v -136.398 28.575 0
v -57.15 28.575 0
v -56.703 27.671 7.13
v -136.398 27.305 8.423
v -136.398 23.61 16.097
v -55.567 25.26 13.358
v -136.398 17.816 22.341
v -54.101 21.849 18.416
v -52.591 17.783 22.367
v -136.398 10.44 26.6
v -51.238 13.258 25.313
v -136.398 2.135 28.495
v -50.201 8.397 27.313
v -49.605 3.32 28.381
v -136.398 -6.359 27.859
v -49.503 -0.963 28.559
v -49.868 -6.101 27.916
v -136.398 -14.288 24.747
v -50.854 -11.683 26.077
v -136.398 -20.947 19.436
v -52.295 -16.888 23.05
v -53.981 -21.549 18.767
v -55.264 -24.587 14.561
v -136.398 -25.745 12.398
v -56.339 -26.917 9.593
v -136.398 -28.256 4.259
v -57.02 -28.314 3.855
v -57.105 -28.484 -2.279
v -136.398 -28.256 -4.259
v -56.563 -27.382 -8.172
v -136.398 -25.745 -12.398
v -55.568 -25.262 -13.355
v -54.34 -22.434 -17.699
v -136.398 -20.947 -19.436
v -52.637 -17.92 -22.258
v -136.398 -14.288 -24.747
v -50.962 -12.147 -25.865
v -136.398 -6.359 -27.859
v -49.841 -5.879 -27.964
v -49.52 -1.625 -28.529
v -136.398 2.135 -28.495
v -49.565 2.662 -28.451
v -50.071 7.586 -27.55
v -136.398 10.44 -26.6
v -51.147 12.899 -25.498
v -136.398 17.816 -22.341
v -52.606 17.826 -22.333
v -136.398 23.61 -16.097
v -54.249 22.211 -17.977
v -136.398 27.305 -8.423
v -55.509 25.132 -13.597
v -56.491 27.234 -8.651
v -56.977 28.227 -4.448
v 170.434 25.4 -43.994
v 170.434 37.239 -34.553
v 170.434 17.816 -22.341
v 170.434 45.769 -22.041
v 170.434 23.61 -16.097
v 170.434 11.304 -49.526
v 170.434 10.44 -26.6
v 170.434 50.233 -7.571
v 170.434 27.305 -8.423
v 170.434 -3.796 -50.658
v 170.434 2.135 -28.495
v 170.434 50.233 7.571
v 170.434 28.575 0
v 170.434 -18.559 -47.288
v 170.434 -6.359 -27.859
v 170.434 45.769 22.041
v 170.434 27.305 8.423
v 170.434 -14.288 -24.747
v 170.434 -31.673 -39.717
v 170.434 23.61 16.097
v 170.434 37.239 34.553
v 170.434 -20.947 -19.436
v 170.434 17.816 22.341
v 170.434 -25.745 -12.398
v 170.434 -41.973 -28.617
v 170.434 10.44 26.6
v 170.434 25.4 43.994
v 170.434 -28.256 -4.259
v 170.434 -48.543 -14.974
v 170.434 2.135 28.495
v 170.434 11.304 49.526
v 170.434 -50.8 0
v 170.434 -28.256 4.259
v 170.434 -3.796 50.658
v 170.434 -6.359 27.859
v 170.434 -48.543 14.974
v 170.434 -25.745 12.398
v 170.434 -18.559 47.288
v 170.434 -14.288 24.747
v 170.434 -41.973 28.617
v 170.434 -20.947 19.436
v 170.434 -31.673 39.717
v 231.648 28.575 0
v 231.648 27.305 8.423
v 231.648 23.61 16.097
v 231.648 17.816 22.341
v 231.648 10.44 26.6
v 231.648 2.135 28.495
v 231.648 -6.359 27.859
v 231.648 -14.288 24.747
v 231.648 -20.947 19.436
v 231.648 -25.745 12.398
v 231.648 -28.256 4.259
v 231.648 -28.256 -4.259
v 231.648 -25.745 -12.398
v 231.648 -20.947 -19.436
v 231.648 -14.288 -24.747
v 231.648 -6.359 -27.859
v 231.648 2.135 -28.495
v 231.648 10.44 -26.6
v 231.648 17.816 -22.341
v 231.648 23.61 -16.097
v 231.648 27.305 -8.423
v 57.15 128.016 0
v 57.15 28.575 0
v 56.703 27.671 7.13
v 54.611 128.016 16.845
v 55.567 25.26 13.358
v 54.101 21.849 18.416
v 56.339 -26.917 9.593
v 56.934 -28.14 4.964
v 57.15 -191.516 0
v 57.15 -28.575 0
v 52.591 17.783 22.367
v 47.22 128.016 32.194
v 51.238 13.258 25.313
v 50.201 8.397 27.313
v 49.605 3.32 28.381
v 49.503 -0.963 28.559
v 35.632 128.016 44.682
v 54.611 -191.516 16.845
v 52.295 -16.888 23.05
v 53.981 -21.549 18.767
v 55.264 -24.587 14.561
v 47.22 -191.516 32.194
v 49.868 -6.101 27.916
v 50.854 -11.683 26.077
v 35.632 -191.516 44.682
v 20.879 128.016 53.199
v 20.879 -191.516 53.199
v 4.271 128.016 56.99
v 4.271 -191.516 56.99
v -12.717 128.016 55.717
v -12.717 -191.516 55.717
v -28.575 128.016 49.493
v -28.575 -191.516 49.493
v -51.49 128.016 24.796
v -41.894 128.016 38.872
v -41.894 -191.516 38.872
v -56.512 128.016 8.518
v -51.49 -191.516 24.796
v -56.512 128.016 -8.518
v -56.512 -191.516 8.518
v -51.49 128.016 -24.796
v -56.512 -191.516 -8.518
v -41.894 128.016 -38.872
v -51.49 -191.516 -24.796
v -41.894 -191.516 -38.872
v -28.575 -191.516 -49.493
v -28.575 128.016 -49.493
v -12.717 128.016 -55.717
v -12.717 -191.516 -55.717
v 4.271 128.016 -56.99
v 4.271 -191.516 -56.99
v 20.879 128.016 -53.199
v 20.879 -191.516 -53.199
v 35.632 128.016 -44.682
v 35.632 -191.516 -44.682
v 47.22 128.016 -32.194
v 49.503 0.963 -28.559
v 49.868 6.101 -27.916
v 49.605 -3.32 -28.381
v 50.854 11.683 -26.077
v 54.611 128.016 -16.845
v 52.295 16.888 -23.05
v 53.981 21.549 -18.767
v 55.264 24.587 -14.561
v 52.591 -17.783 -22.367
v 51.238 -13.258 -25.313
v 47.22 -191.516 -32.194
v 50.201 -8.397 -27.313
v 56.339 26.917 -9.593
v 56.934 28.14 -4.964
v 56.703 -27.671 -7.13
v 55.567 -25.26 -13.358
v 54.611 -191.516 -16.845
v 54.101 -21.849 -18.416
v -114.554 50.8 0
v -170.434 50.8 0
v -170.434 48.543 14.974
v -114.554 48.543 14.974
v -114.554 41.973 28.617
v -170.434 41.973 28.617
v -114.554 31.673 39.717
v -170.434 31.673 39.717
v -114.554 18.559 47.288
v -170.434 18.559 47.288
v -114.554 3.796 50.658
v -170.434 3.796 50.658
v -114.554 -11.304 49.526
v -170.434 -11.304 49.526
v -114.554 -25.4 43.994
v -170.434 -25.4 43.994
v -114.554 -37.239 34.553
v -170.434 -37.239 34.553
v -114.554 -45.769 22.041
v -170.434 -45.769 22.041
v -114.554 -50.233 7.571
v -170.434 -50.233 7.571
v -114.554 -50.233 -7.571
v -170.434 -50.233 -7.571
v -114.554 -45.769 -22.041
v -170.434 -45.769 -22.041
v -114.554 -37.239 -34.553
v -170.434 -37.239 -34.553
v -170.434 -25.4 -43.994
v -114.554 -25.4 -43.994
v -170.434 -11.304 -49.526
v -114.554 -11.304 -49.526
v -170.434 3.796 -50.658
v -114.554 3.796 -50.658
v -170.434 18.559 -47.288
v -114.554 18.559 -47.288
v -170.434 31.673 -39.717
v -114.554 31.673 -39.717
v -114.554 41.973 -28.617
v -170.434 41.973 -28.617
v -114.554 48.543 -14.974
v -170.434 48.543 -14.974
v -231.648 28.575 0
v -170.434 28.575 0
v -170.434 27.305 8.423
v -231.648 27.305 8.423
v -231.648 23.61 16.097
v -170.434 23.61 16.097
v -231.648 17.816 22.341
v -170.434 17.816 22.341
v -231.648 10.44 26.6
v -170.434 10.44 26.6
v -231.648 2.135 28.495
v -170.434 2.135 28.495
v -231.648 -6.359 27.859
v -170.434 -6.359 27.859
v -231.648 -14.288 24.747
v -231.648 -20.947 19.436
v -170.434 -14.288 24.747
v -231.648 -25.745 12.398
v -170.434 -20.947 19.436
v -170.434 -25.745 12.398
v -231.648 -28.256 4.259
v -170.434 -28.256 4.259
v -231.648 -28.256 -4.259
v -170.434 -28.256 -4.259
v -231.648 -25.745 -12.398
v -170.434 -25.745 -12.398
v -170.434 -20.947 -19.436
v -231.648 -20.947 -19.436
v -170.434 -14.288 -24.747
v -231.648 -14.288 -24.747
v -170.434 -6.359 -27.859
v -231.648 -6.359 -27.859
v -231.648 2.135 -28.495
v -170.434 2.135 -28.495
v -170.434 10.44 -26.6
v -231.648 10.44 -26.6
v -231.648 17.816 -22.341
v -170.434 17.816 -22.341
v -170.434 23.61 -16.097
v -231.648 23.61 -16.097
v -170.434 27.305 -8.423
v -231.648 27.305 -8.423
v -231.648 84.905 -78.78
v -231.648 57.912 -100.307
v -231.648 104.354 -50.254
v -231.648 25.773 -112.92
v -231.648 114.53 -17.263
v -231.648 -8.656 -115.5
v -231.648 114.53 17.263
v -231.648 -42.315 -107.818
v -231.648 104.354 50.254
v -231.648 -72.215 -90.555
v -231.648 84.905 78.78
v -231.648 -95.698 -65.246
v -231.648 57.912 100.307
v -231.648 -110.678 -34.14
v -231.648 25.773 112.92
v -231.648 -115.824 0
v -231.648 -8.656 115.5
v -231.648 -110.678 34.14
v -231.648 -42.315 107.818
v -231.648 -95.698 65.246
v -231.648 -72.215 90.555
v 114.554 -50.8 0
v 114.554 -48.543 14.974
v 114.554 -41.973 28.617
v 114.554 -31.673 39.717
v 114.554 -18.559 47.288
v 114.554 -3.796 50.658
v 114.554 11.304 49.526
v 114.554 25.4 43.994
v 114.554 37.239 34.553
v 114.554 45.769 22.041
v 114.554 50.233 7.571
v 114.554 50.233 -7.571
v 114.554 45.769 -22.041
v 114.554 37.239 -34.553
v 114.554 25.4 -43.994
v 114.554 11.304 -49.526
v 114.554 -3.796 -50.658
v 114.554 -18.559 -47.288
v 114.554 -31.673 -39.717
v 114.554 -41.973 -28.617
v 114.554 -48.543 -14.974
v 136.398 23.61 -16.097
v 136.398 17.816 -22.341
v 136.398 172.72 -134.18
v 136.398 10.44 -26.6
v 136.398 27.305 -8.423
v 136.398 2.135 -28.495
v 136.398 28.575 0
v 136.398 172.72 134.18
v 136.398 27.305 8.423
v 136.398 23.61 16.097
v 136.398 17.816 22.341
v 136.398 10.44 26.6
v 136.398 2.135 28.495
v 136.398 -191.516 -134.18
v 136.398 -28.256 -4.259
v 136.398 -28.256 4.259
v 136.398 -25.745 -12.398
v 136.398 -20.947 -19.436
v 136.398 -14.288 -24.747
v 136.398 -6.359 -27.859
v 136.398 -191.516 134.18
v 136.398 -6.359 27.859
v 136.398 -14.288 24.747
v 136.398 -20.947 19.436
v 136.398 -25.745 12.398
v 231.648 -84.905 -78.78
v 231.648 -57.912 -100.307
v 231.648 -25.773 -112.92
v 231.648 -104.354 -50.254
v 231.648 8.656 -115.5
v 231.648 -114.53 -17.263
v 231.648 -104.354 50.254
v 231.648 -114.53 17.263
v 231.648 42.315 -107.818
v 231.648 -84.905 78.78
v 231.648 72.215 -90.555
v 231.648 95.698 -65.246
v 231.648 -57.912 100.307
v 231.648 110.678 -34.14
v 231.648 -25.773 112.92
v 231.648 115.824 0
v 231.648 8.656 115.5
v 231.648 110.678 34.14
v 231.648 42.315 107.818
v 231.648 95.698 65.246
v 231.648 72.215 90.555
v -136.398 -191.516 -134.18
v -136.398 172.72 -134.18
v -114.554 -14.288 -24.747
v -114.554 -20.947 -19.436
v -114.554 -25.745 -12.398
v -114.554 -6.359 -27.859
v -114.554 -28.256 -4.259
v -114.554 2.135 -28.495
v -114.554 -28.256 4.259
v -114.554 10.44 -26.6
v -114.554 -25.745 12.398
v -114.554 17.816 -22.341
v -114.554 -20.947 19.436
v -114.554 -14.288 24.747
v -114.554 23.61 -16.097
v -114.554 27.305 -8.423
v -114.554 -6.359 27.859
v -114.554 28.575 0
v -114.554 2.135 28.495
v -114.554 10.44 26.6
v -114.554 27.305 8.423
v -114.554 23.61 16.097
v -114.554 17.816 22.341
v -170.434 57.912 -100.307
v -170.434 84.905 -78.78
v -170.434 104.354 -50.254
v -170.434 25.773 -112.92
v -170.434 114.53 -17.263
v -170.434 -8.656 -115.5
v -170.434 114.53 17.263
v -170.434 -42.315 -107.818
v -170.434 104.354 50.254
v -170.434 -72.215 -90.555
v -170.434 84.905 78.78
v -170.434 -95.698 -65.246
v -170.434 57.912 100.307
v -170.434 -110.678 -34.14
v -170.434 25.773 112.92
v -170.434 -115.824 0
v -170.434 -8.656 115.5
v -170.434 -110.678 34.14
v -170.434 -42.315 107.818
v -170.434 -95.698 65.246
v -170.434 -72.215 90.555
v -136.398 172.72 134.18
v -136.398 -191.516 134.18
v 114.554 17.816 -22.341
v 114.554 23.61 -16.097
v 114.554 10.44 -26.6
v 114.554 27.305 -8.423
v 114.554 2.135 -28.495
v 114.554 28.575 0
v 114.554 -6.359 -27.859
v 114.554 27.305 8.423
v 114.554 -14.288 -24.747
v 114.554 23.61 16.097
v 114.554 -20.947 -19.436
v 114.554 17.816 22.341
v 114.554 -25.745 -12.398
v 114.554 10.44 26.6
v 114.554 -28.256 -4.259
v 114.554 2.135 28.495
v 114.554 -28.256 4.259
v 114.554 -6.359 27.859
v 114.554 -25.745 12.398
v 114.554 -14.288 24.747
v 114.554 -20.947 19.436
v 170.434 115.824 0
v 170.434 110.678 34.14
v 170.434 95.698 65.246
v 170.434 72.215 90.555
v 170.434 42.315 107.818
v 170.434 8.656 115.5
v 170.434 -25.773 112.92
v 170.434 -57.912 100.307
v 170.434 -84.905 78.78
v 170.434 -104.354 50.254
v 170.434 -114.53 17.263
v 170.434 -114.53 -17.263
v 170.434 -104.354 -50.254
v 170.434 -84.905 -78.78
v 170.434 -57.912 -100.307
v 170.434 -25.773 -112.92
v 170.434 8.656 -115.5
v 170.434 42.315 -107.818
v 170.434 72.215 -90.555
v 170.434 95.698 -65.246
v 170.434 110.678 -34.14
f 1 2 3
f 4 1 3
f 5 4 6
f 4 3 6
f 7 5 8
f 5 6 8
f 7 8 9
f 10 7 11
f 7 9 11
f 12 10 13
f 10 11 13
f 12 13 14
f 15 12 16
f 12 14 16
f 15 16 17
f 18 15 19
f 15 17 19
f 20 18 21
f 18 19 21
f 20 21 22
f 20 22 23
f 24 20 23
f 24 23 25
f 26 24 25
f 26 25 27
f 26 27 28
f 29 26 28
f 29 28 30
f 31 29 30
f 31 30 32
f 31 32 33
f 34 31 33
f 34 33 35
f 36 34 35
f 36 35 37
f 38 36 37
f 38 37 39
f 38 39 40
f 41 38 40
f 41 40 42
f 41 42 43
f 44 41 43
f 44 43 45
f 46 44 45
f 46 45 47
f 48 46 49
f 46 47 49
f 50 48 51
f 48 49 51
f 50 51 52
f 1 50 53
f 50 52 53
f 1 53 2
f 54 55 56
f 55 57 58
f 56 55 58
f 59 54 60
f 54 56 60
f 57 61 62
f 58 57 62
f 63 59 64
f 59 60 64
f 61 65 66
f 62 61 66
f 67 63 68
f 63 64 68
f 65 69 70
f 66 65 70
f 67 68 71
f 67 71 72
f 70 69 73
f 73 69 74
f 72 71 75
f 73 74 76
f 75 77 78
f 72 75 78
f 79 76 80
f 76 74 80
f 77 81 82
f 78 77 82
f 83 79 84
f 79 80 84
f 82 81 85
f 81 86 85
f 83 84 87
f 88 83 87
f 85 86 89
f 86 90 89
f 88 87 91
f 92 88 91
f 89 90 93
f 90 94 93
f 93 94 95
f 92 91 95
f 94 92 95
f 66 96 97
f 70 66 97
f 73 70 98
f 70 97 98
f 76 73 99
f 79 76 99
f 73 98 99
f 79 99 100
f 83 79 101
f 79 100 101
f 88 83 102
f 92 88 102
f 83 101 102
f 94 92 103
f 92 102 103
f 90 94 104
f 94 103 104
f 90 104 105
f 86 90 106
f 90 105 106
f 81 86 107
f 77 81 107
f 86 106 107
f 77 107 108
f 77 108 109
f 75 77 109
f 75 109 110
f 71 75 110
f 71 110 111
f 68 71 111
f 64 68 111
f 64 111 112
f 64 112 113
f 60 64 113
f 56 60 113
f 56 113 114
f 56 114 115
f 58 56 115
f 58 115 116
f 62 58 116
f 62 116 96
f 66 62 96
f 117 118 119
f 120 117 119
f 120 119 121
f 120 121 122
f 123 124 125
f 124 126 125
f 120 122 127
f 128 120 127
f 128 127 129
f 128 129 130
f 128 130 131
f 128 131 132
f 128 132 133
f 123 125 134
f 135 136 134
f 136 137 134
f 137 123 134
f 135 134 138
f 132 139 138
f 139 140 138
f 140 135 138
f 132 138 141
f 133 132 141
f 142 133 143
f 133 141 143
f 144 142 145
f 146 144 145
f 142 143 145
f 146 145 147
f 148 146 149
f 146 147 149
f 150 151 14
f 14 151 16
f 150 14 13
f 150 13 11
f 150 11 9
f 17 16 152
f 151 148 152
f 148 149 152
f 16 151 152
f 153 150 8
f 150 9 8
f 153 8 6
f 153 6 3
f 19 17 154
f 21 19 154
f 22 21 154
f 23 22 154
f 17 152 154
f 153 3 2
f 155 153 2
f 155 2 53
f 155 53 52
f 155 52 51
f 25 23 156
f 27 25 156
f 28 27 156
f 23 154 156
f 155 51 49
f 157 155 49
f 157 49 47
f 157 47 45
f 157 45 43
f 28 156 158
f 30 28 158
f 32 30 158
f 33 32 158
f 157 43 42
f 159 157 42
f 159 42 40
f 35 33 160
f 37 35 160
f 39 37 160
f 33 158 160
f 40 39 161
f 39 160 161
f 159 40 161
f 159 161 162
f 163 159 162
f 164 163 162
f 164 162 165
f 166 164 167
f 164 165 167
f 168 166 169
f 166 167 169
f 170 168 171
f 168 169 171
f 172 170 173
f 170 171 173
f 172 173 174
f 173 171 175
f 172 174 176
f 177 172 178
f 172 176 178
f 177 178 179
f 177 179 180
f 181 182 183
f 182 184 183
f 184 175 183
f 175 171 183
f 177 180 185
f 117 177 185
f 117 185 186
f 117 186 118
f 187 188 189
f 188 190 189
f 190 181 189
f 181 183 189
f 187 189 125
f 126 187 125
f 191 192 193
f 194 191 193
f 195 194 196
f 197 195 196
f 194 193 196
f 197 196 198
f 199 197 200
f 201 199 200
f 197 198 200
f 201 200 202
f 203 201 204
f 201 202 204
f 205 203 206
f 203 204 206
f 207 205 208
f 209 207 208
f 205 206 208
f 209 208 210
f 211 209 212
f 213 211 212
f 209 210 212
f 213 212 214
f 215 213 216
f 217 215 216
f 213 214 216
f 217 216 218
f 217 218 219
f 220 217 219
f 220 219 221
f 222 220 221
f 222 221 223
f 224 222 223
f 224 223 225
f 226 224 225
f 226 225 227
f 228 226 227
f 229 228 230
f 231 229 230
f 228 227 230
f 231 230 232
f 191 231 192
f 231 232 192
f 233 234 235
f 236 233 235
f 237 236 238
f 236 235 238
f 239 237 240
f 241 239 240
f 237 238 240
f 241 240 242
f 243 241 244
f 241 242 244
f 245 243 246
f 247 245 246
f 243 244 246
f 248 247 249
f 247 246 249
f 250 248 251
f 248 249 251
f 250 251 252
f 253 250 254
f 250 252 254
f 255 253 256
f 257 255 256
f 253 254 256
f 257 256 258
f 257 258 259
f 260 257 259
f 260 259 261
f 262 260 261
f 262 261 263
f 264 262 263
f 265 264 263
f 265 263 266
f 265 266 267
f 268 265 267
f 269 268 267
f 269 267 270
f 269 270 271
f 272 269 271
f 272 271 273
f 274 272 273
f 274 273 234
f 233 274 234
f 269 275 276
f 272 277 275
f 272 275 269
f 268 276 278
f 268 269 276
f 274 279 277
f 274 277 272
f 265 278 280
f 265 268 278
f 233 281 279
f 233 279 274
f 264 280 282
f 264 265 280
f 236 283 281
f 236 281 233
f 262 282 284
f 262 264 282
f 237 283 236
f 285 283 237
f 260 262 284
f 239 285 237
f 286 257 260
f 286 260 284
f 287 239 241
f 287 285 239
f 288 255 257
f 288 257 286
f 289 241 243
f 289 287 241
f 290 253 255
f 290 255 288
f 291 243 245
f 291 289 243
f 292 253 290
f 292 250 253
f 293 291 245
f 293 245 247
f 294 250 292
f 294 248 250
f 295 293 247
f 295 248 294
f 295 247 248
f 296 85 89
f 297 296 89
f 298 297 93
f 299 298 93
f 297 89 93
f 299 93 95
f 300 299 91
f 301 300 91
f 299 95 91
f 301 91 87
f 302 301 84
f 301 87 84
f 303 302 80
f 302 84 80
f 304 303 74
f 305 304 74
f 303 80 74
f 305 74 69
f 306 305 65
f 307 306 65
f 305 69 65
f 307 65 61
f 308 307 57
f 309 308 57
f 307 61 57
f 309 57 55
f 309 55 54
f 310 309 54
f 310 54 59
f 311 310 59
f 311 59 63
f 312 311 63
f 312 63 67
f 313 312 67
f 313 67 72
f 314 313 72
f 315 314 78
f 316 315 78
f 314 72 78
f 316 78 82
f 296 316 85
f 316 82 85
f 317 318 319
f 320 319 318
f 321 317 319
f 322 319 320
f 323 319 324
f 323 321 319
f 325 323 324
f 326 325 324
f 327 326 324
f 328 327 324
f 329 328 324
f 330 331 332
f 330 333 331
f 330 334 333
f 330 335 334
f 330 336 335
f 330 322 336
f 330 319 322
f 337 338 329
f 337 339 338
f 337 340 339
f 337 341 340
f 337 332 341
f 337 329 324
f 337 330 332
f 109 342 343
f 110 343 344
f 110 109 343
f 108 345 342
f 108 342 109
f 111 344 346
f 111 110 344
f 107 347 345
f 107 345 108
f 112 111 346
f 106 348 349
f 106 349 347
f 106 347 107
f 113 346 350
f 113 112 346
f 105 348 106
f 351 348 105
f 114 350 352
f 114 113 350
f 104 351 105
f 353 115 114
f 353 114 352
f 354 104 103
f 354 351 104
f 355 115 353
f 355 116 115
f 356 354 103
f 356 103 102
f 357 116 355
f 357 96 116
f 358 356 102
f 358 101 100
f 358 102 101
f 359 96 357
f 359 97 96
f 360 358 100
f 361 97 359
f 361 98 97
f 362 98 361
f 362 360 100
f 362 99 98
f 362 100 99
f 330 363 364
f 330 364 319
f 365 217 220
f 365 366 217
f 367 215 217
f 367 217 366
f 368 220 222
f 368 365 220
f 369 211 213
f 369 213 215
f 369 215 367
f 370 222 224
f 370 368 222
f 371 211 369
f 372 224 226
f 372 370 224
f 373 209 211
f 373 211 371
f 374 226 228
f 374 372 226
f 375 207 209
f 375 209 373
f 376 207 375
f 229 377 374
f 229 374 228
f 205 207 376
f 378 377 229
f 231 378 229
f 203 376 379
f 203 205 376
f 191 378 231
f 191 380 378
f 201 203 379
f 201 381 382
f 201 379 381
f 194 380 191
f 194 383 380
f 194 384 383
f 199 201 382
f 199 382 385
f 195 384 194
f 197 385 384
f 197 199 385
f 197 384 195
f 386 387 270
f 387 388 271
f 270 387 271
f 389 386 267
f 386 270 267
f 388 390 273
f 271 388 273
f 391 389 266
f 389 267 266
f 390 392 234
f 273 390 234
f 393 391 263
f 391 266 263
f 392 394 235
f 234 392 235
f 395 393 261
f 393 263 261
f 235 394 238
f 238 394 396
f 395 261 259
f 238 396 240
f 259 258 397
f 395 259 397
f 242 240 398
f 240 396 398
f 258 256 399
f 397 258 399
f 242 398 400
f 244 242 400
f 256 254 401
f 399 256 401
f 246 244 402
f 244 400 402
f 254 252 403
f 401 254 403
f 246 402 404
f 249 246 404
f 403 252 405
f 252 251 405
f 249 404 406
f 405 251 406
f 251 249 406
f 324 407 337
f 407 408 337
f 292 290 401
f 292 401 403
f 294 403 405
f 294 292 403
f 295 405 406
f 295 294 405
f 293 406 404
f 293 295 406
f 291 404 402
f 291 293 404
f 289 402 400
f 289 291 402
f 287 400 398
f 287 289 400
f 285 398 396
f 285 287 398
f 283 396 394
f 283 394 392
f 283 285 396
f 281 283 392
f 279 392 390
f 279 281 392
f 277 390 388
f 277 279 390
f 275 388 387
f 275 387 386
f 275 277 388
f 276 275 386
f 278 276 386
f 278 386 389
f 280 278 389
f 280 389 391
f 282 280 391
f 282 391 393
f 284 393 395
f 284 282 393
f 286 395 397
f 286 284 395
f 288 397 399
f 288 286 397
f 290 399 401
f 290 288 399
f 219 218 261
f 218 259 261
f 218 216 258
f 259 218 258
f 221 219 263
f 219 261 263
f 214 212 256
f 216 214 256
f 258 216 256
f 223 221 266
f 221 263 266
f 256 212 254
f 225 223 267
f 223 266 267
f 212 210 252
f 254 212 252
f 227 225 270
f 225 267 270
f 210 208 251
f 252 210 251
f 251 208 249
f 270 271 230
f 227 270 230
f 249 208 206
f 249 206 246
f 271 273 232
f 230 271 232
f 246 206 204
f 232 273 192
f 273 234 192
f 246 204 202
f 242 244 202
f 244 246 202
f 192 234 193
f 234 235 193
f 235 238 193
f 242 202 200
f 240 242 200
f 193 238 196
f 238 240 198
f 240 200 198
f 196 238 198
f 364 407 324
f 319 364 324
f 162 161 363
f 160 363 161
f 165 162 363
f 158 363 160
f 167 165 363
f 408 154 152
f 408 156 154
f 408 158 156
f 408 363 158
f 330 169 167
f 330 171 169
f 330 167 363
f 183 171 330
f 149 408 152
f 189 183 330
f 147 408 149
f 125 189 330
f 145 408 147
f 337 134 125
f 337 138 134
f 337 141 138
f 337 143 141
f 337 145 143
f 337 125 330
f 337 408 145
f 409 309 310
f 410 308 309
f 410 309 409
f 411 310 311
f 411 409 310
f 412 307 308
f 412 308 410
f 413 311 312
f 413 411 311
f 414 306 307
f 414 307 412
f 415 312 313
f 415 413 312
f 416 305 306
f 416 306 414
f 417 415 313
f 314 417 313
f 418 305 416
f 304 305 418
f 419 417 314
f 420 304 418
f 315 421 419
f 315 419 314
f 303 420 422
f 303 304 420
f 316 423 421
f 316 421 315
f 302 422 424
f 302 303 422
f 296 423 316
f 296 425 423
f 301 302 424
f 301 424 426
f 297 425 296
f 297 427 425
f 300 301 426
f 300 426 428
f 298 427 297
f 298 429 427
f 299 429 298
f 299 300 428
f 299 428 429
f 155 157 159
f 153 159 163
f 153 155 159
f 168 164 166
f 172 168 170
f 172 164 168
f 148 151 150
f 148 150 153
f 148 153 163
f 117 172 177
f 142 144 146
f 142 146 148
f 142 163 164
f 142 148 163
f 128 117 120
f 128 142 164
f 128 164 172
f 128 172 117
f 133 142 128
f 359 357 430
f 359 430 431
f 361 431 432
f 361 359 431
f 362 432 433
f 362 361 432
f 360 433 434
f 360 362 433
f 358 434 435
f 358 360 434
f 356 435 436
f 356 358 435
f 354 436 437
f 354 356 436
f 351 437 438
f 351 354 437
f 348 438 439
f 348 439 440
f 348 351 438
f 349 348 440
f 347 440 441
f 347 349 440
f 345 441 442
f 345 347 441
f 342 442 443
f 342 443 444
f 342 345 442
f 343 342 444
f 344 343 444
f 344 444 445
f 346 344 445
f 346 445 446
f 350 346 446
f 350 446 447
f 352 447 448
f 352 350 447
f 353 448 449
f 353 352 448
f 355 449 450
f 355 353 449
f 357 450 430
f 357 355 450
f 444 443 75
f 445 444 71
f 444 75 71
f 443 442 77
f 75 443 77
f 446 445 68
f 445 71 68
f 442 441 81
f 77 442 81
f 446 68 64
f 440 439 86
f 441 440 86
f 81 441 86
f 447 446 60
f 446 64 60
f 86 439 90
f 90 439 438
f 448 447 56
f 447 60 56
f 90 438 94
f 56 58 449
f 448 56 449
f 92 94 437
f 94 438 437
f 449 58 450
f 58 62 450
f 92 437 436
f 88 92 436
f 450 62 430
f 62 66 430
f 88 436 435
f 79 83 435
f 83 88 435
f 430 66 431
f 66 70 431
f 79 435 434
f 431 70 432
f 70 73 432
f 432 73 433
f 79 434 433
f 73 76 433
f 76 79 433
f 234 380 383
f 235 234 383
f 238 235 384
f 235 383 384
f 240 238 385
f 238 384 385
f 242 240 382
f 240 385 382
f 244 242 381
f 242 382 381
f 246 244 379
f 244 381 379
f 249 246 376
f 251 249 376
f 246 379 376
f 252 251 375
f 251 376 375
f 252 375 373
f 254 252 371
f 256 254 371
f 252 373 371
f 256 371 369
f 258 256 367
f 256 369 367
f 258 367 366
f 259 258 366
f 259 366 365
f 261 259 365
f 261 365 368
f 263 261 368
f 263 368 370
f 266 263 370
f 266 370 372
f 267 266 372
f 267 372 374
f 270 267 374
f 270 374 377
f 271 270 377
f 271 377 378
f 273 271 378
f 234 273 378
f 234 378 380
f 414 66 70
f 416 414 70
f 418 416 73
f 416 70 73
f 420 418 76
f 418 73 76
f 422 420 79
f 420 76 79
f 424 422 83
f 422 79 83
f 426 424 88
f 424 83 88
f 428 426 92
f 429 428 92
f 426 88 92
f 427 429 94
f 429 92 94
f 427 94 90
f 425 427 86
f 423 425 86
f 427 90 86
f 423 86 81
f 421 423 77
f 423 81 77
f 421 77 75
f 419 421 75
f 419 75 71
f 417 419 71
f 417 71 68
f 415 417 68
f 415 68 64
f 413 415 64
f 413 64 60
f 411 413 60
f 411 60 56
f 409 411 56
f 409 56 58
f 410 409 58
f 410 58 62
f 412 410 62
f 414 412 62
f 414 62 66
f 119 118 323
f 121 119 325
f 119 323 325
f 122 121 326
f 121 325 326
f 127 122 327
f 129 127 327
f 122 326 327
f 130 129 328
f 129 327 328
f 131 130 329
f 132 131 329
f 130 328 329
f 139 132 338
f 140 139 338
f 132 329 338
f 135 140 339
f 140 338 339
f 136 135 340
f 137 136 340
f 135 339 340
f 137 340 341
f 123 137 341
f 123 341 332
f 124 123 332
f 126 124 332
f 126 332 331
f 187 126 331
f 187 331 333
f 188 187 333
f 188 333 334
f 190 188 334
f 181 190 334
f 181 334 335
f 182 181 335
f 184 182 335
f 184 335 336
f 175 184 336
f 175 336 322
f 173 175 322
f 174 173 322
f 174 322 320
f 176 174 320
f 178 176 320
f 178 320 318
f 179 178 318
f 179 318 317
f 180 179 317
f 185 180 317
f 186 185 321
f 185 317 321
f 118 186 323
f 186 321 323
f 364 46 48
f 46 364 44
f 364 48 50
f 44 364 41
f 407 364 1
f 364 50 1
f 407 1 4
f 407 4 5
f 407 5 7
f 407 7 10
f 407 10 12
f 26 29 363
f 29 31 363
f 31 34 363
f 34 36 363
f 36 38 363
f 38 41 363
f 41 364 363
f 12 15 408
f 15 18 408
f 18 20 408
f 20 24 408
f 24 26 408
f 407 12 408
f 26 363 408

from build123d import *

# Parameters (mm, degrees)
F0_W      = 272.796
F0_H      = 268.3603210601
F1_DEPTH  = 191.516
F2_DEPTH  = 172.72
F4_R      = 115.824
F5_DEPTH  = 61.214
F6_R      = 50.8
F7_DEPTH  = 55.88
F9_COUNT  = 2
F10_R     = 28.575
F11_DEPTH = 701.04
F12_R     = 57.15
F13_DEPTH = 319.532


with BuildPart() as f1:
    # F0 (on Front) → F1 (new body)
    with BuildSketch(Plane.XZ):
        Rectangle(F0_W, F0_H)
    extrude(amount=F1_DEPTH)

    # F2 (add): a face of the model
    f2_faces = [f1.faces().sort_by_distance(p)[0] for p in [
        (0, 0, 0),
    ]]
    extrude(f2_faces, amount=F2_DEPTH)


with BuildPart() as f5:
    # F4 (on offset) → F5 (new body)
    with BuildSketch(Plane.YZ.offset(231.648)):
        Circle(F4_R)
    extrude(amount=-F5_DEPTH)


with BuildPart() as f7:
    # F6 (on face) → F7 (new body)
    with BuildSketch(Plane(origin=(170.434, 0, 0), x_dir=(0, -1, 0), z_dir=(-1, 0, 0))):
        Circle(F6_R)
    extrude(amount=F7_DEPTH)


with BuildPart() as f9_1:
    # F9: instance of F7
    add(f7.part.rotate(Axis((0, 0, 105.2917167544), (0, 0, 1)), 1 * 360 / F9_COUNT))


with BuildPart() as f9_2:
    # F9: instance of F5
    add(f5.part.rotate(Axis((0, 0, 105.2917167544), (0, 0, 1)), 1 * 360 / F9_COUNT))


with BuildPart() as f11_tool:
    # F10 (on face) → F11 (new body)
    with BuildSketch(Plane.YZ.offset(231.648)):
        Circle(F10_R)
    extrude(amount=-F11_DEPTH)


with BuildPart() as f1_1:
    add(f1.part)

    # F11: cut by f11_tool
    add(f11_tool.part, mode=Mode.SUBTRACT)

    # F12 (on face) → F13 (cut)
    with BuildSketch(Plane.XZ.offset(191.516)):
        Circle(F12_R)
    extrude(amount=-F13_DEPTH, mode=Mode.SUBTRACT)


with BuildPart() as f5_1:
    add(f5.part)

    # F11: cut by f11_tool
    add(f11_tool.part, mode=Mode.SUBTRACT)


with BuildPart() as f7_1:
    add(f7.part)

    # F11: cut by f11_tool
    add(f11_tool.part, mode=Mode.SUBTRACT)


with BuildPart() as f9_1_1:
    add(f9_1.part)

    # F11: cut by f11_tool
    add(f11_tool.part, mode=Mode.SUBTRACT)


with BuildPart() as f9_2_1:
    add(f9_2.part)

    # F11: cut by f11_tool
    add(f11_tool.part, mode=Mode.SUBTRACT)


solid = Compound([f1_1.part, f5_1.part, f7_1.part, f9_1_1.part, f9_2_1.part])
